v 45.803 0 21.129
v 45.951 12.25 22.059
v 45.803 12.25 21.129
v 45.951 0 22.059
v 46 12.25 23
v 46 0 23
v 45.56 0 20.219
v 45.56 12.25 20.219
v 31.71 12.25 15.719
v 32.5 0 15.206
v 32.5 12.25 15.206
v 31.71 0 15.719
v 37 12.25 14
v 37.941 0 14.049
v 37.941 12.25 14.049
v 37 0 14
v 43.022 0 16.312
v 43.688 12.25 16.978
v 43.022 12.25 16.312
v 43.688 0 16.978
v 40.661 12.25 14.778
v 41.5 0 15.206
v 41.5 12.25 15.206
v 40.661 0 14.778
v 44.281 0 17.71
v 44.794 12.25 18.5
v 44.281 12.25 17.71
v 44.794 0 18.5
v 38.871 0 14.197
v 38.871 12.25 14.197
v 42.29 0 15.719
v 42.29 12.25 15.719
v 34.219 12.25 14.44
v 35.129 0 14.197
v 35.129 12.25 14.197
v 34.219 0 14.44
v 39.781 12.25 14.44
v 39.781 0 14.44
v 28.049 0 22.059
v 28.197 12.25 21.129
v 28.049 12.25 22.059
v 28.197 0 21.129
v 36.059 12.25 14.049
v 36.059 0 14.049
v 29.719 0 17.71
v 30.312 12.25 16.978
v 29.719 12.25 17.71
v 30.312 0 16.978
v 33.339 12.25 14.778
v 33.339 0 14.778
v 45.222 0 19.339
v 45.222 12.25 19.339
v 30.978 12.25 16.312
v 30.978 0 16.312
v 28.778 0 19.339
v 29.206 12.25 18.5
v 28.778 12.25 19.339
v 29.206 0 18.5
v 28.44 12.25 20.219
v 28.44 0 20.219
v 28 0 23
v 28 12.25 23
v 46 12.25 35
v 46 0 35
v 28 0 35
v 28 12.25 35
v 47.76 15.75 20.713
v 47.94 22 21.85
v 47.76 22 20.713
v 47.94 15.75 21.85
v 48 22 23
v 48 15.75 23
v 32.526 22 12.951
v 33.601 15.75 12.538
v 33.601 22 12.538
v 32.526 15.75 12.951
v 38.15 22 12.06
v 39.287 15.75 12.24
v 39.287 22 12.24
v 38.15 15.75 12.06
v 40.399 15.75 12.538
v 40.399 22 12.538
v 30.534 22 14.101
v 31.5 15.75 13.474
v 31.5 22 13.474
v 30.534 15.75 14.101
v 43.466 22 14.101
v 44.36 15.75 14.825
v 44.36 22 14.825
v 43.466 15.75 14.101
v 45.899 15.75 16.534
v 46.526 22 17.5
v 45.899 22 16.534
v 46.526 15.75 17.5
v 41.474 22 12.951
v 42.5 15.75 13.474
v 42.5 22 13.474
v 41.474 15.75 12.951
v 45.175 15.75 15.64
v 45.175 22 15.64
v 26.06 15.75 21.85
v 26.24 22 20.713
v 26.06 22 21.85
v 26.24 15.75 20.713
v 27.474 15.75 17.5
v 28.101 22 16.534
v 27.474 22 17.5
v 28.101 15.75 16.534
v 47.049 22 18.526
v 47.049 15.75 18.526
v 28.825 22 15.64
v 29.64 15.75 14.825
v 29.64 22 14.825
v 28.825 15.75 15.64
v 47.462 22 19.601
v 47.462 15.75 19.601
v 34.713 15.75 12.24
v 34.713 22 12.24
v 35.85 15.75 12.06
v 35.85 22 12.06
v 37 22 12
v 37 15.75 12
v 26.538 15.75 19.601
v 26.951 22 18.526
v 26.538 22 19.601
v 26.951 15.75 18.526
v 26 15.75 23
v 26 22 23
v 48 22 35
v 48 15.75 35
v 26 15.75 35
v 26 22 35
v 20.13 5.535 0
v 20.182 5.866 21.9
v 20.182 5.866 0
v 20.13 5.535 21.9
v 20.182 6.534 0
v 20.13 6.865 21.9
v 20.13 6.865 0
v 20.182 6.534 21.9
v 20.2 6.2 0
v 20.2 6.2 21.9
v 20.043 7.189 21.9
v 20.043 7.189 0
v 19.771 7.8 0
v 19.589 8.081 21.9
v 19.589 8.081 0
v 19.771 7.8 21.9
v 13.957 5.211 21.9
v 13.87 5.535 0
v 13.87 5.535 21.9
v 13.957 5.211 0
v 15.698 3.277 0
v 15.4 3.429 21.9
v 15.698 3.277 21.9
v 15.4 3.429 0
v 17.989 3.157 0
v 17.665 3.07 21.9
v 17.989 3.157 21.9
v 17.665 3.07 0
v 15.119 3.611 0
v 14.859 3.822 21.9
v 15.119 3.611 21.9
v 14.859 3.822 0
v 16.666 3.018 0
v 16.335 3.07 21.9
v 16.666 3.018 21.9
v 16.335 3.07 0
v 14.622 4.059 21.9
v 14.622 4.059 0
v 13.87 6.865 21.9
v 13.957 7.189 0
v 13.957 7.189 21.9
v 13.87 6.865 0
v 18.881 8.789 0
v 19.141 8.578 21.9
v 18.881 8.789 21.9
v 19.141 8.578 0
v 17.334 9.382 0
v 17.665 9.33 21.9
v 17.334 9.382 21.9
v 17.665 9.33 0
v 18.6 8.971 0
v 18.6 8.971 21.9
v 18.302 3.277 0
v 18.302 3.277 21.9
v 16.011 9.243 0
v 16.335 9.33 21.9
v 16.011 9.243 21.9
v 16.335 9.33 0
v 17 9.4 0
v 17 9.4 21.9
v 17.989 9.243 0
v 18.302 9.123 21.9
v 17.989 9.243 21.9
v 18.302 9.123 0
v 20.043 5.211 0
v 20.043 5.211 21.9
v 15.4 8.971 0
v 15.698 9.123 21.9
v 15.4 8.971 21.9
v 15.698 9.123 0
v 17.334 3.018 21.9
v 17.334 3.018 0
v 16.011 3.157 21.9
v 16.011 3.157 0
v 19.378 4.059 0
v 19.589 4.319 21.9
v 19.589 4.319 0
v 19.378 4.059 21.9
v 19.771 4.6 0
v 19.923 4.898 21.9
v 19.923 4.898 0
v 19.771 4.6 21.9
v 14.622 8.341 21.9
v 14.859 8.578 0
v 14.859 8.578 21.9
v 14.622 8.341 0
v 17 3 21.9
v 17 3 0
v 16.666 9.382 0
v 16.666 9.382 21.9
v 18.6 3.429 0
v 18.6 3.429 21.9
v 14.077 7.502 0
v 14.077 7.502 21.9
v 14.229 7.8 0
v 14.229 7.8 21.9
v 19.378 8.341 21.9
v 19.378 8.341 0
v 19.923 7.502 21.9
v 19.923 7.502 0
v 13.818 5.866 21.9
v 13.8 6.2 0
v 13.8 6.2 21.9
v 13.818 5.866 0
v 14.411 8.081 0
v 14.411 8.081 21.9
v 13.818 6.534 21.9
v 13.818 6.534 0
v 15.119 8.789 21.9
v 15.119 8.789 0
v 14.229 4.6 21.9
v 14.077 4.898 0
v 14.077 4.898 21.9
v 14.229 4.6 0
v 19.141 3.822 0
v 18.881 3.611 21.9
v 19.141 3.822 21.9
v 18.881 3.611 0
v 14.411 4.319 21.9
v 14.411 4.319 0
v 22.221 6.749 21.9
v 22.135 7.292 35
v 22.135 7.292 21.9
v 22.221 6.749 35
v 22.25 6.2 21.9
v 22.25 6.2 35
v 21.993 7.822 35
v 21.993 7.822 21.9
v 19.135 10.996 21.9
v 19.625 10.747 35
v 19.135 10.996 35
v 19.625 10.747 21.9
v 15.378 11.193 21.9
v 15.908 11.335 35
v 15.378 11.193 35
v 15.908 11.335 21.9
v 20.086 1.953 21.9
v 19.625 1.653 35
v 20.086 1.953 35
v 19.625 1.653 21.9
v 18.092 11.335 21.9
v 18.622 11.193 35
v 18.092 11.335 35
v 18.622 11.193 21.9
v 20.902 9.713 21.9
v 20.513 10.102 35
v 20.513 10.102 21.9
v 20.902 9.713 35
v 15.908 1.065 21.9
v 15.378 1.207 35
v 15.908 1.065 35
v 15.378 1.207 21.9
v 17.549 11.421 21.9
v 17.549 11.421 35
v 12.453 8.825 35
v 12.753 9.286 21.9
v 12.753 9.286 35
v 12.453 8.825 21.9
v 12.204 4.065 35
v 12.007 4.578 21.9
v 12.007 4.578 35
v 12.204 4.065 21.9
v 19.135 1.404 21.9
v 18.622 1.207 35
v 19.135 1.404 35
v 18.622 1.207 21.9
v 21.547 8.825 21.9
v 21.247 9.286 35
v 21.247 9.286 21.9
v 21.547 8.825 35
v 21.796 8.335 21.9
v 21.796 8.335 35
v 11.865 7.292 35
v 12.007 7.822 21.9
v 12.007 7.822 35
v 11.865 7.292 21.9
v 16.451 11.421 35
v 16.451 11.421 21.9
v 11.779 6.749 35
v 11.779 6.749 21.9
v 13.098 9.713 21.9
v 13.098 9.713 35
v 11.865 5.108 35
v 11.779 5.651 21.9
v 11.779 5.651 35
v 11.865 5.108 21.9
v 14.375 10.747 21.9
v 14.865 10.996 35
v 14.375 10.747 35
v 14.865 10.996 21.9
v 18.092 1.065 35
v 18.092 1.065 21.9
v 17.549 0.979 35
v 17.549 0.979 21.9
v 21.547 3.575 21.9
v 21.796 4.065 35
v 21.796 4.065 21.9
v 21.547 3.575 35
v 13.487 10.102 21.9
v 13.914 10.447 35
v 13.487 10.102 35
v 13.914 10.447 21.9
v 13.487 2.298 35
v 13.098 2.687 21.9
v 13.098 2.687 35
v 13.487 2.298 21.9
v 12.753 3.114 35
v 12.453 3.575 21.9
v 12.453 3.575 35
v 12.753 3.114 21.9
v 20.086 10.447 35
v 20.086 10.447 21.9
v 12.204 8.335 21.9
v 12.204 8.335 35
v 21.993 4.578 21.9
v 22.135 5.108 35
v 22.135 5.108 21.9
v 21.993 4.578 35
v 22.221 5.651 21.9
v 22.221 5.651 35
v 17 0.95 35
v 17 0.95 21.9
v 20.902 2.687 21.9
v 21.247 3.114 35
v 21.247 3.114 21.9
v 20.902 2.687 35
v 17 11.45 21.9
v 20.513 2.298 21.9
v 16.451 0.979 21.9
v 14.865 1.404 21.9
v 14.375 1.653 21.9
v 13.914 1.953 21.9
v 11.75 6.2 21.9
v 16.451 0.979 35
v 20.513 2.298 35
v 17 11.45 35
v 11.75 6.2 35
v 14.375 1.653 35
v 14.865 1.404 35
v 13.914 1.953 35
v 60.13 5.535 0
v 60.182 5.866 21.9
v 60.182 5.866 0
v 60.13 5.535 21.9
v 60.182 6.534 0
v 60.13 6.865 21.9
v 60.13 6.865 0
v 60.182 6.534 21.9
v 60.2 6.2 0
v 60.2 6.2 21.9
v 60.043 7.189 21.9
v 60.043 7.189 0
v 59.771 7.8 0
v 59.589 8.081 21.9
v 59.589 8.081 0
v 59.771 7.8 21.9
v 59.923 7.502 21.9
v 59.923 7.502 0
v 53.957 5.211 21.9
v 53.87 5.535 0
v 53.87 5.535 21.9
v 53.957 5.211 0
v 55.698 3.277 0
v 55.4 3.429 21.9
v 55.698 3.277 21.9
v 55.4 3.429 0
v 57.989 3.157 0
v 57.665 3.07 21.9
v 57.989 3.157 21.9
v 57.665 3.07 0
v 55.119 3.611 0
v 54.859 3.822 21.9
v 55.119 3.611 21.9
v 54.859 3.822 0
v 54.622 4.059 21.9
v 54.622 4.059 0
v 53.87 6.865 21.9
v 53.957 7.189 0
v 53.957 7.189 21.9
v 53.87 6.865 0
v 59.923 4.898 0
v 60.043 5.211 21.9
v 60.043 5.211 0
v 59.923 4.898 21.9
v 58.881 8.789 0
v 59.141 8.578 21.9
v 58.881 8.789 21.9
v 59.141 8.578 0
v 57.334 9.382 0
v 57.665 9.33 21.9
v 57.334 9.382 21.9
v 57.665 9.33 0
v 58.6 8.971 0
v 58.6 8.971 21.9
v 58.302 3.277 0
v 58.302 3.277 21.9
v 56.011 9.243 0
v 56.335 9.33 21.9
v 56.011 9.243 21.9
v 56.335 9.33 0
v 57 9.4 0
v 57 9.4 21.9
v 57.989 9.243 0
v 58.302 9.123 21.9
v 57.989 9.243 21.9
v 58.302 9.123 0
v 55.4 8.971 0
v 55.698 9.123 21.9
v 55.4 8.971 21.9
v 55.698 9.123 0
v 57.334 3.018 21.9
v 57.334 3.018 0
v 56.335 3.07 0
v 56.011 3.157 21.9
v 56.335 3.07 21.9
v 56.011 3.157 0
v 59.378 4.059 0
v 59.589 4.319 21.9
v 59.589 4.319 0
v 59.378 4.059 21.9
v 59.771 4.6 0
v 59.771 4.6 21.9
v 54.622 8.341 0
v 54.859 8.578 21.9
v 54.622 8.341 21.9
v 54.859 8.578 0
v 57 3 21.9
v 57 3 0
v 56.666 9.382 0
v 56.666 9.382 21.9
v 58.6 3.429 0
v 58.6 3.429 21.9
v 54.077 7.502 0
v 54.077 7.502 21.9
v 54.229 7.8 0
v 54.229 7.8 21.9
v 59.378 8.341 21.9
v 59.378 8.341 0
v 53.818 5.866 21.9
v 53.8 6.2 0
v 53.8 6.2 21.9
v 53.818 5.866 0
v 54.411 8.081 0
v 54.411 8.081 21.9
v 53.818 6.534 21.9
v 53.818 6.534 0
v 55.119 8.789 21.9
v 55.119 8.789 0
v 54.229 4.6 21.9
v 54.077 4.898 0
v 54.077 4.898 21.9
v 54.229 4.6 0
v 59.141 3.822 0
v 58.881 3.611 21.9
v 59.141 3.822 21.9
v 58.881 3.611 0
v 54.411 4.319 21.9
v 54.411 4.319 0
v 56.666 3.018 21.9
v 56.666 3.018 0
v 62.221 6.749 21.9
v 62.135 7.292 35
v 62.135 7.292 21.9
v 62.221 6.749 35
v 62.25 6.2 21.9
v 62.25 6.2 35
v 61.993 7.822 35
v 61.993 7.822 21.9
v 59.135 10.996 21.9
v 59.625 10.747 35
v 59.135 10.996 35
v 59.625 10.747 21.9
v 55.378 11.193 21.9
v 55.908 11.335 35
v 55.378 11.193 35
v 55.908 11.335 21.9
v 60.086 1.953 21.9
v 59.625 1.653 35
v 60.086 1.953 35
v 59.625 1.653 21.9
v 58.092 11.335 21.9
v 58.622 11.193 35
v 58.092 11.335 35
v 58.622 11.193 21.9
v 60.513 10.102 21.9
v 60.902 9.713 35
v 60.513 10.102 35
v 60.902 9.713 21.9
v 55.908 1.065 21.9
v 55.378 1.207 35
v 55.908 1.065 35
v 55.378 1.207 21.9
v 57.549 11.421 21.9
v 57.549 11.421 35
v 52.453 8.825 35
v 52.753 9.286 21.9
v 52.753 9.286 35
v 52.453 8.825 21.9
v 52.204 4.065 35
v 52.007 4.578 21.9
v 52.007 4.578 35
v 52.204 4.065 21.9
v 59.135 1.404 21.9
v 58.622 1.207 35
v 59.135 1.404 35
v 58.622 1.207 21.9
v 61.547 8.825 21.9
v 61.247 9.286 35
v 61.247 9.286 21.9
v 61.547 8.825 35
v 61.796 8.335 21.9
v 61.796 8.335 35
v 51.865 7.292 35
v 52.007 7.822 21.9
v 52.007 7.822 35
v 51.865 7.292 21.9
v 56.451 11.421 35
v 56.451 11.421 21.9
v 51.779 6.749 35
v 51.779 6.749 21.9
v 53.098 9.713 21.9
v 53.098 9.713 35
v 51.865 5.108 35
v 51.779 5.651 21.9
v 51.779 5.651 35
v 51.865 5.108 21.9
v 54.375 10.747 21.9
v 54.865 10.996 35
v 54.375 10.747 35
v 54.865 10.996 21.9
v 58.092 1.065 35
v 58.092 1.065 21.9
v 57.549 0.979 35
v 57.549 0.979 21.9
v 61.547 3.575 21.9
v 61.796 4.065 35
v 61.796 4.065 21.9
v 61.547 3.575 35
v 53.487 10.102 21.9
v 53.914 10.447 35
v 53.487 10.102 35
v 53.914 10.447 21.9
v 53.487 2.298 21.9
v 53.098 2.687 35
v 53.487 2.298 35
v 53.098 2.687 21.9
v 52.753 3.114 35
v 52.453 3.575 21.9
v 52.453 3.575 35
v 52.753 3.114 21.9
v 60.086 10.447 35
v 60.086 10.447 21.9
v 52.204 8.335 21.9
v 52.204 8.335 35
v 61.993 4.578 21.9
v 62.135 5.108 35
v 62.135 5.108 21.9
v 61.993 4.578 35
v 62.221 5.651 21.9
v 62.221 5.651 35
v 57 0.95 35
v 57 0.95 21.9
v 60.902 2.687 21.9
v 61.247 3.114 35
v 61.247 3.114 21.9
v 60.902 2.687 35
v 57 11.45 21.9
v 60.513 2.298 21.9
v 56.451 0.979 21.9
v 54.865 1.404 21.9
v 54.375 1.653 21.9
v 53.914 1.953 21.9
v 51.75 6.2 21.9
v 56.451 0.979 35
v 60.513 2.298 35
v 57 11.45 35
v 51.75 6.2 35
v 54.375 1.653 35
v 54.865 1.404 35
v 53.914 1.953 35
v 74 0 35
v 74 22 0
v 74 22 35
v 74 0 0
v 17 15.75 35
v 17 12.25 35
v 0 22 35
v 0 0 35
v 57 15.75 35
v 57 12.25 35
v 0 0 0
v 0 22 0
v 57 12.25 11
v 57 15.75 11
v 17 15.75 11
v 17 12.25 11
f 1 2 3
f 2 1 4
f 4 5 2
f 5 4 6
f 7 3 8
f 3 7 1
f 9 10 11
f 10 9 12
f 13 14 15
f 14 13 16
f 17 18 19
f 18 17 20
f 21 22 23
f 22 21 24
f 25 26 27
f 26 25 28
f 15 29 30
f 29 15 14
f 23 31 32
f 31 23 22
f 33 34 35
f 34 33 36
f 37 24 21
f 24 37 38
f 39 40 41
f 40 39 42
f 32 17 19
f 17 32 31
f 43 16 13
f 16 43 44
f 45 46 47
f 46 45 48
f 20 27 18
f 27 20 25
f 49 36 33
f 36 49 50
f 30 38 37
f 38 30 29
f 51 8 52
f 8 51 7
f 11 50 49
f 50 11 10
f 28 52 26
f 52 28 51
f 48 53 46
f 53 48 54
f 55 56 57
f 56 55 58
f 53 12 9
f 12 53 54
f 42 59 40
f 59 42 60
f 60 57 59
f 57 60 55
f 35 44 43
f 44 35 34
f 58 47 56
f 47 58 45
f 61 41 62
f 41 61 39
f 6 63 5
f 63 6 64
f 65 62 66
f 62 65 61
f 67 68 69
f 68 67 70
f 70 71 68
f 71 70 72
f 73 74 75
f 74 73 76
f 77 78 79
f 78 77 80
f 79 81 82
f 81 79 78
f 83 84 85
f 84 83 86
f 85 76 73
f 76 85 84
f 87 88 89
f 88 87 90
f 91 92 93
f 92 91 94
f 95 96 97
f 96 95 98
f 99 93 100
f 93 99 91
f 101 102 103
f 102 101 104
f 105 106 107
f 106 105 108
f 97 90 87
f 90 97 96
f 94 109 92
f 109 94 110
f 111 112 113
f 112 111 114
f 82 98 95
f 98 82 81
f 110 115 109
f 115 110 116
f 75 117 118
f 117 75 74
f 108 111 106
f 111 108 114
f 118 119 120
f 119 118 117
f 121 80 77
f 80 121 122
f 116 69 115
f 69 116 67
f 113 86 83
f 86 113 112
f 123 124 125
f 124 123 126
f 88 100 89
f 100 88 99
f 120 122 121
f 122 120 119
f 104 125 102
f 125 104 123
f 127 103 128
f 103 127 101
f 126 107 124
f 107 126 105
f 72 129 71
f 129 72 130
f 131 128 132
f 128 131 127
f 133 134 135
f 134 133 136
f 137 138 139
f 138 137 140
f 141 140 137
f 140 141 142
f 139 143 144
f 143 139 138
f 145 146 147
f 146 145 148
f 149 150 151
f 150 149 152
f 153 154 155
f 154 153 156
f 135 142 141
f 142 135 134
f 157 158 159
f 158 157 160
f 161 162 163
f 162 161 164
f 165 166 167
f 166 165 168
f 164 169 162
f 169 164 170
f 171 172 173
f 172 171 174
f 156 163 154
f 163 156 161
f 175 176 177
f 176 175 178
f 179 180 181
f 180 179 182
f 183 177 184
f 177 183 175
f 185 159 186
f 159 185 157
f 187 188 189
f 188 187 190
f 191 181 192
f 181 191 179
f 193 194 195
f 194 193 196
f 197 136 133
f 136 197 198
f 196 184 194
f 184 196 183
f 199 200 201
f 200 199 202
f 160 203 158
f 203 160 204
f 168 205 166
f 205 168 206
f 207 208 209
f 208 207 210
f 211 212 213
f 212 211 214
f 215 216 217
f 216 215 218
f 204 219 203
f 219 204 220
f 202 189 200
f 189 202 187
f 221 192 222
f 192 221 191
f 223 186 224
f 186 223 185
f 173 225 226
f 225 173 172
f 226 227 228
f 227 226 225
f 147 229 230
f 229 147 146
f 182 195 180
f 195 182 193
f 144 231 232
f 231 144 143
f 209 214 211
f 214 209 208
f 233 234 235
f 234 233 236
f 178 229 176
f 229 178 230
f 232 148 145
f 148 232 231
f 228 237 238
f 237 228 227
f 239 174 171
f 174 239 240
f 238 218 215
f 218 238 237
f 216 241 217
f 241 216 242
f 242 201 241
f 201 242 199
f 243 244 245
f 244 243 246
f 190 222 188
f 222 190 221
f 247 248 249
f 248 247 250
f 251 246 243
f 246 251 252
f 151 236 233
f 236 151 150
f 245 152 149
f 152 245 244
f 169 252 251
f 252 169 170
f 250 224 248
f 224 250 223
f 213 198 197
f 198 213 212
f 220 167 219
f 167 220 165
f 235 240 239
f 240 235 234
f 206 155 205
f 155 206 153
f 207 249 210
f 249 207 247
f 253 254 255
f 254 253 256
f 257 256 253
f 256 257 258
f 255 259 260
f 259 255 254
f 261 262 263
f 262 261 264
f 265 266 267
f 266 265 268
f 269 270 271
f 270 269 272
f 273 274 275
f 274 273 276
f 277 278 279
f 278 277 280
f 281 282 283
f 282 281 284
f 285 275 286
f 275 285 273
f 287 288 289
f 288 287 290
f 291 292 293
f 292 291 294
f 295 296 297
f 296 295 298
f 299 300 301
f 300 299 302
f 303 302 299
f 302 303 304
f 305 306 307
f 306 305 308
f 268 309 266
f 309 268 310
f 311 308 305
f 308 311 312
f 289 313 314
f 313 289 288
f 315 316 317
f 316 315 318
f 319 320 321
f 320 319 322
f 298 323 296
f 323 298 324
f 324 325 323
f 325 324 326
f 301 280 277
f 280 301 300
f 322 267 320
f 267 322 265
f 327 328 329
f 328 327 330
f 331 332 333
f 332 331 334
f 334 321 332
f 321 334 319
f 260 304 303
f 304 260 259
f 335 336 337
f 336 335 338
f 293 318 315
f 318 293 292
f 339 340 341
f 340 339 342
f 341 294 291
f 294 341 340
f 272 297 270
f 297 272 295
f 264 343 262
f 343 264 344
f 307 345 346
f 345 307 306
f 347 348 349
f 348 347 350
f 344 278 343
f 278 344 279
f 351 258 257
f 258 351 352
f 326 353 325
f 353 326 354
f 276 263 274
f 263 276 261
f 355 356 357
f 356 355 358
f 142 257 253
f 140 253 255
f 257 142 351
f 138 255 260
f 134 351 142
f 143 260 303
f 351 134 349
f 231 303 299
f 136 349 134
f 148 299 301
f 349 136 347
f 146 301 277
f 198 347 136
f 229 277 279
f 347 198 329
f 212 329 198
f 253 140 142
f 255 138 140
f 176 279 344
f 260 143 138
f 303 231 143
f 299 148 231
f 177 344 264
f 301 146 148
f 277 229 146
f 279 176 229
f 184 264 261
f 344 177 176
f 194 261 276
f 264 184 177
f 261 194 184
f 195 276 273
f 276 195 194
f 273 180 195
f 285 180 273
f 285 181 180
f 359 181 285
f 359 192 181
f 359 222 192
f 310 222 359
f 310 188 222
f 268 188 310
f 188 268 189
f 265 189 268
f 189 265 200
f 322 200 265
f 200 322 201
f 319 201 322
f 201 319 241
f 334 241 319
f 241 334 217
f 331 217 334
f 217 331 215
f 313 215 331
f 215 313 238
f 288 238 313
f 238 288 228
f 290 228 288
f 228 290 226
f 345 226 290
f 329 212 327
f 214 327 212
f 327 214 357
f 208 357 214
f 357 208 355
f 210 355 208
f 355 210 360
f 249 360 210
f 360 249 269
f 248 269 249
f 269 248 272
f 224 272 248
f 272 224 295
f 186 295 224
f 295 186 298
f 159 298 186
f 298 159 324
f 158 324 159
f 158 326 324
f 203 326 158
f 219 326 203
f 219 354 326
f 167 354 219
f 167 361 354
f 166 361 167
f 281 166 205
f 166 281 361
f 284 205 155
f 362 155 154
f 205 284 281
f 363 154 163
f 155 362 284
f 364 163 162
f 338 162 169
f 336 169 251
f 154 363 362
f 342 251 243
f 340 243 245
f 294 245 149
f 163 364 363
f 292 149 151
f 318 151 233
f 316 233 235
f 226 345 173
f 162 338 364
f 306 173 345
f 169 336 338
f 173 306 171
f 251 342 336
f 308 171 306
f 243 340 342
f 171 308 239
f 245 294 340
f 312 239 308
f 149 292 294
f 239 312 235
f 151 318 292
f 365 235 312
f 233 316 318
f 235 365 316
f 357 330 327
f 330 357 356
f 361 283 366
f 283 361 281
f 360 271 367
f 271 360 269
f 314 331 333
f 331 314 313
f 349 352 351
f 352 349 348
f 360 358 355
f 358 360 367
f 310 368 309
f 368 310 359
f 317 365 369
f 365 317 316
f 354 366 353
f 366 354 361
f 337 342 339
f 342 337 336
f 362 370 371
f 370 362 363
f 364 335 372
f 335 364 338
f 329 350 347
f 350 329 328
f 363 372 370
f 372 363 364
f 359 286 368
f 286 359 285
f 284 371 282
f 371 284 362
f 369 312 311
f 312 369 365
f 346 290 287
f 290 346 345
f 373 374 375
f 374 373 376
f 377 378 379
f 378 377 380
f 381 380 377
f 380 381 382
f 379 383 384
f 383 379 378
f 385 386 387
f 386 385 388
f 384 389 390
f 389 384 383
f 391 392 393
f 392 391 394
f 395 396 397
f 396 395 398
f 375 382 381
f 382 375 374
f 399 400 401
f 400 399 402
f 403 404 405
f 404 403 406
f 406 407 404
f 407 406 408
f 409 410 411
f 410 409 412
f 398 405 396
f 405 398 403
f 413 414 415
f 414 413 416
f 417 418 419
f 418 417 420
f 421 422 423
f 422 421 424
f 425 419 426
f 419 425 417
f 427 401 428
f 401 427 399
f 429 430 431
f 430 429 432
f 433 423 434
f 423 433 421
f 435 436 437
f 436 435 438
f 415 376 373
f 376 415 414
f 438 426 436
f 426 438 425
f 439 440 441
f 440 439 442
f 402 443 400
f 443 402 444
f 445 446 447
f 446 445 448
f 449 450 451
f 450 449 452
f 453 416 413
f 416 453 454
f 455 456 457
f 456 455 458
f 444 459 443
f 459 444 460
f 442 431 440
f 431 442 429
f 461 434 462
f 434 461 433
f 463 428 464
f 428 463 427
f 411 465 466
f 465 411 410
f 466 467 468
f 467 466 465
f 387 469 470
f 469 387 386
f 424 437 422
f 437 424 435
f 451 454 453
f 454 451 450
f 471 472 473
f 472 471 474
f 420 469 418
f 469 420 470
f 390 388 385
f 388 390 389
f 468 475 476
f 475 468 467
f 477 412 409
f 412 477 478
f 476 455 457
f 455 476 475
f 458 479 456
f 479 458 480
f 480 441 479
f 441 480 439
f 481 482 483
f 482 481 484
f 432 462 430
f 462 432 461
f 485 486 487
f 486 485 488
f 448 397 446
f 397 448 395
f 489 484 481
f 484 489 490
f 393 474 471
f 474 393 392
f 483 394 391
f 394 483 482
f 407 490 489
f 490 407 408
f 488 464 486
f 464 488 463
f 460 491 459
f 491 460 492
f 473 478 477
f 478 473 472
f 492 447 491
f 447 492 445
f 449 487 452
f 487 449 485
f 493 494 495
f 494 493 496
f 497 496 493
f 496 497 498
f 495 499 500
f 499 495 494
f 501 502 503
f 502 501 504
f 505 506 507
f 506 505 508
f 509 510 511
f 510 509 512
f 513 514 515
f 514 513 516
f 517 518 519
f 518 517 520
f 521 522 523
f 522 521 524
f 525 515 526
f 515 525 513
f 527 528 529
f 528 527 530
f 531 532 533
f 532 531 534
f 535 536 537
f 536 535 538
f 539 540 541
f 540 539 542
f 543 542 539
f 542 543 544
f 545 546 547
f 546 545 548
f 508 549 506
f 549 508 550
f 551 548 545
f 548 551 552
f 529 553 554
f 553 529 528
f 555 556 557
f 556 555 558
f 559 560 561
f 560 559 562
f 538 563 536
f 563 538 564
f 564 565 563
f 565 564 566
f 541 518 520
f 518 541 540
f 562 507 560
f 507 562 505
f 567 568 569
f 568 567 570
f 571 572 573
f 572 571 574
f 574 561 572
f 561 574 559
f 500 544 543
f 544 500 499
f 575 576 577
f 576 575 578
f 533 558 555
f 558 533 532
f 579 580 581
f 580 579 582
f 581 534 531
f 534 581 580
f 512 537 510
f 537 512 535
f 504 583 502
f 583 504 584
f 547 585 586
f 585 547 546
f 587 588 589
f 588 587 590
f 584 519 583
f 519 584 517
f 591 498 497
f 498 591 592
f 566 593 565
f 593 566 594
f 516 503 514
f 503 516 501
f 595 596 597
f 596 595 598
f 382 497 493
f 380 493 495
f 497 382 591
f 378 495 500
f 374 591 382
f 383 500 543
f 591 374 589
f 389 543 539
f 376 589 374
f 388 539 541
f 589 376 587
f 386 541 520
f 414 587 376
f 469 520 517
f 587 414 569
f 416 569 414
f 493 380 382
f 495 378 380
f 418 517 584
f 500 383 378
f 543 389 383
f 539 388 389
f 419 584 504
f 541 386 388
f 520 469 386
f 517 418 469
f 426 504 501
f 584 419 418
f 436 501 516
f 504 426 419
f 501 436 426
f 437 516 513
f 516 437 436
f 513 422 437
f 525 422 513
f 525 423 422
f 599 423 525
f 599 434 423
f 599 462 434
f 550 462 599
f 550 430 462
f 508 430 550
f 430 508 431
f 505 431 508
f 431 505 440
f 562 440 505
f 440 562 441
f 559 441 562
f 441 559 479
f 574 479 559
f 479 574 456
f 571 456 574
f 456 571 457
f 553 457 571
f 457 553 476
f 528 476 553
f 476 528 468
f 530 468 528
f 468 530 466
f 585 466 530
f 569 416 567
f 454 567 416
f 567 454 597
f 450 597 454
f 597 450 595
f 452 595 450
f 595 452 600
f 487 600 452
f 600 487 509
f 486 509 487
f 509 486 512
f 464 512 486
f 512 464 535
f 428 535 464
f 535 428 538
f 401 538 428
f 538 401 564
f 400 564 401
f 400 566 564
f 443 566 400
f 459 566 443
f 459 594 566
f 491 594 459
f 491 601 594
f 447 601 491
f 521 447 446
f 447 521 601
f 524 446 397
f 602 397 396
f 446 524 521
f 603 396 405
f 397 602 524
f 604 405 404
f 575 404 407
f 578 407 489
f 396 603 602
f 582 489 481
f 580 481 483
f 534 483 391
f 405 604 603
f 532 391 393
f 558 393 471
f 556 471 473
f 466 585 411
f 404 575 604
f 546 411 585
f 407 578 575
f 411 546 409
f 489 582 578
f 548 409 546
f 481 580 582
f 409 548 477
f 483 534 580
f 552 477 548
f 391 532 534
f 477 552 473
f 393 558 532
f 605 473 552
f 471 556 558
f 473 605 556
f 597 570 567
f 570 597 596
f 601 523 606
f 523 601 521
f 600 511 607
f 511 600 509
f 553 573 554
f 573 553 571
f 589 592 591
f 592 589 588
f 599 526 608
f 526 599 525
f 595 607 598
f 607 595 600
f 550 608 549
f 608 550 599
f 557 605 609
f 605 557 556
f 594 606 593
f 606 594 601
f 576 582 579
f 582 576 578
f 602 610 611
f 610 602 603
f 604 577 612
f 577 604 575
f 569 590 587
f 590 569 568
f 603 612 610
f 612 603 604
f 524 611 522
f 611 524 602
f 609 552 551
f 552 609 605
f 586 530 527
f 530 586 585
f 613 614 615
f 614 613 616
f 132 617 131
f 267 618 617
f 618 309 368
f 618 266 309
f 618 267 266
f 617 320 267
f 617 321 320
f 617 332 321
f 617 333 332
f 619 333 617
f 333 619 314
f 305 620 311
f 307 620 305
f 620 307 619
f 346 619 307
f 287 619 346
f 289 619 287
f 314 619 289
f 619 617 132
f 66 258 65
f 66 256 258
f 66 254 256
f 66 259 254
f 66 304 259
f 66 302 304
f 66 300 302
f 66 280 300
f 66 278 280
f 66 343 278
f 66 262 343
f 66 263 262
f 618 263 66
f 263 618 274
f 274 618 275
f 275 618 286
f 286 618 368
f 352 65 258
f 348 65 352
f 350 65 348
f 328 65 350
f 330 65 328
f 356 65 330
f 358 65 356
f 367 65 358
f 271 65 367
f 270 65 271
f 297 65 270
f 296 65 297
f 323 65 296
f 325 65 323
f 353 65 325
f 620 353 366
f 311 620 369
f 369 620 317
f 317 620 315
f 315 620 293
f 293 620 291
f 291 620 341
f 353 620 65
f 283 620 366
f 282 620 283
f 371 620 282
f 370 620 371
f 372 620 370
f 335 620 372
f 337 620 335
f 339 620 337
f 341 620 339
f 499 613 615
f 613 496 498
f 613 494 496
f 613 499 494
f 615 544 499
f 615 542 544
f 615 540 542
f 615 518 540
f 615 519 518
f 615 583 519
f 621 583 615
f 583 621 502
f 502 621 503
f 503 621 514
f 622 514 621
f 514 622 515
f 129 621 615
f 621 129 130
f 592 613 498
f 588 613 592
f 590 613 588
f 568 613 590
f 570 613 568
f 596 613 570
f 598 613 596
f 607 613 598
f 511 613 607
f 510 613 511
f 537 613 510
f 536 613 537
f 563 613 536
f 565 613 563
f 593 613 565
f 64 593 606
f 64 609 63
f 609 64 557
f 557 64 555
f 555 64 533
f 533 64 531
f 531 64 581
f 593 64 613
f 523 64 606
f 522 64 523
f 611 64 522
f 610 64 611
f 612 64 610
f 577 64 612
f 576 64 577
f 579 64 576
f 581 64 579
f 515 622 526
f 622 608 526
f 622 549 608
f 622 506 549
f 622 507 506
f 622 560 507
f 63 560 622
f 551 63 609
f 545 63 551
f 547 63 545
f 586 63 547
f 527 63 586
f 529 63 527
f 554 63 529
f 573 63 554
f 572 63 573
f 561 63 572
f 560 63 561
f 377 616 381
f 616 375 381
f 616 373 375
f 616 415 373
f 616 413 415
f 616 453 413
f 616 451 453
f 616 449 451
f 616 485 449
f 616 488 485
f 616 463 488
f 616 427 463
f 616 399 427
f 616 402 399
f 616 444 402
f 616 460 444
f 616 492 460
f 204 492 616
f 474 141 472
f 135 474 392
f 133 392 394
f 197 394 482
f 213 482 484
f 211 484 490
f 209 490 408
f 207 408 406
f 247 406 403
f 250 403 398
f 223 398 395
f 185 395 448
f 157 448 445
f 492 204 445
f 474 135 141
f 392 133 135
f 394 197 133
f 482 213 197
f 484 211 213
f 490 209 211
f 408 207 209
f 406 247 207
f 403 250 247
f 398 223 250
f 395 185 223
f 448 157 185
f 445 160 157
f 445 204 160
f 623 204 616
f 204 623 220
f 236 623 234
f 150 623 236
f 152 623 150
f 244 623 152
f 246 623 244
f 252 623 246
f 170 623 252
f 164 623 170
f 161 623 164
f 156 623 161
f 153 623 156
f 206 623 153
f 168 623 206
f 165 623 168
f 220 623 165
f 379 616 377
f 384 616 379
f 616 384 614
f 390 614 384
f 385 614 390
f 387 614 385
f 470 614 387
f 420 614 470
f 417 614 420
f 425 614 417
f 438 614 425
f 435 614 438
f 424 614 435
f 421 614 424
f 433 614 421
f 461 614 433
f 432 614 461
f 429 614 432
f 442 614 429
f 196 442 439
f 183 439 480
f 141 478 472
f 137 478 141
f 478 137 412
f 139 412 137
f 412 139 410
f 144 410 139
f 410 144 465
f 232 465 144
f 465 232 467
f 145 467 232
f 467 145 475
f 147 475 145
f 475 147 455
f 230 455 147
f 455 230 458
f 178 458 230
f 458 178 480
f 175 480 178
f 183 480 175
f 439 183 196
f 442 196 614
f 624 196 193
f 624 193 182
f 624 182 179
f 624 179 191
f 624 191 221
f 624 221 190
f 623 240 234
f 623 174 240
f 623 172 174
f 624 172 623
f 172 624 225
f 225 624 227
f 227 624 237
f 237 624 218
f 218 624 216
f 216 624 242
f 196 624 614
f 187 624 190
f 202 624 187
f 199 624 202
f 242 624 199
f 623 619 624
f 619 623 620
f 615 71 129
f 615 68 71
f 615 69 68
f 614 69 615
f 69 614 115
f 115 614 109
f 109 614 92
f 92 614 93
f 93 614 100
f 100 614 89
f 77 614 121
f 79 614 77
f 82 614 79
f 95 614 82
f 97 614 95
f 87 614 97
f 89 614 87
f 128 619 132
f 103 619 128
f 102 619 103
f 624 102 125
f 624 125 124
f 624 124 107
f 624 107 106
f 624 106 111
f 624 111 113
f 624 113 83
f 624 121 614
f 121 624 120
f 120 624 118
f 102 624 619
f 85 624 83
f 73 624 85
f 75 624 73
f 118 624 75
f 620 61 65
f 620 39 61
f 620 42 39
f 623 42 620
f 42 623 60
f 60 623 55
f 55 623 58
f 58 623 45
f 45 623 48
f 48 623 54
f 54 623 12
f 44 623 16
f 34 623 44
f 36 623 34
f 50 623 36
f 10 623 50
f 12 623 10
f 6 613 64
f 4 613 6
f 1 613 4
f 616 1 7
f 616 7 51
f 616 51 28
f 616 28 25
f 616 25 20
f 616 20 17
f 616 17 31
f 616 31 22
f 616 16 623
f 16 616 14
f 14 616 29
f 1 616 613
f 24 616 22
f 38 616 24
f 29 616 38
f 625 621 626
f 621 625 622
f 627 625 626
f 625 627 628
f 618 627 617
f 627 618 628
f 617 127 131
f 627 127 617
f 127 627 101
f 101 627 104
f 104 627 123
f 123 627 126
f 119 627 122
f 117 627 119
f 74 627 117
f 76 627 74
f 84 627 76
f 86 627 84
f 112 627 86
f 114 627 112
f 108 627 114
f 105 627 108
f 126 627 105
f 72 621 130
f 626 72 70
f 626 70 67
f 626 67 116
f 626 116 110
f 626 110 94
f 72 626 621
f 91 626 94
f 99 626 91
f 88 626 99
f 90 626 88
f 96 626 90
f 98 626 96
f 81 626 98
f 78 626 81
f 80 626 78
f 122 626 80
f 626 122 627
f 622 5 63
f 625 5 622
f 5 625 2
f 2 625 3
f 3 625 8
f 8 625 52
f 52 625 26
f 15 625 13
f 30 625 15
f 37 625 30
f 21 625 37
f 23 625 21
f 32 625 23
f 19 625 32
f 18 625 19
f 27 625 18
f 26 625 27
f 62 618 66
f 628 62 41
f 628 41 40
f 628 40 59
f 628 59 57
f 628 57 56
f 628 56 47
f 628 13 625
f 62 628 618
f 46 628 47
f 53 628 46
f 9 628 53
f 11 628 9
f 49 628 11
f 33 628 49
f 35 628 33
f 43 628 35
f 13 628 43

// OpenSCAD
// file: mount.scad
//nema_17_mount();

module nema_17_mount()
{
	$fs = 0.1;

	wall_thickness = 5;
	motor_width = 42;
	frame_width = motor_width + (wall_thickness + 1)*2;
	bolt = 4;
	height = 25;
	

	
	//center the whole thing in X
	translate([-frame_width/2, 0, 0])
	{
		difference()
		{
			//build the main unit.
			union()
			{
				//structure
				cube([wall_thickness, frame_width, frame_width]); //front face
				cube([frame_width, wall_thickness, frame_width]); //left face
				translate([frame_width-wall_thickness, 0, 0])     //right face
					cube([wall_thickness, frame_width, frame_width]);
            }

			//nema 17 mount
			rotate([90, 0, 0])
			{
				translate([frame_width/2, height, -wall_thickness])
				{
					translate([15.5, 15.5, 0])
						cylinder(r=bolt/2, h=wall_thickness+1);
					translate([-15.5, 15.5, 0])
						cylinder(r=bolt/2, h=wall_thickness+1);
					translate([15.5, -15.5, 0])
						cylinder(r=bolt/2, h=wall_thickness+1);
					translate([-15.5, -15.5, 0])
						cylinder(r=bolt/2, h=wall_thickness+1);

					cylinder(r=11.5, h=wall_thickness+1);

					translate([-11.5, 0, 0])
						cube([23, frame_width, wall_thickness+1]);
				}
			}

			//back slant cutaway
			translate([0, 0, frame_width+wall_thickness])
				rotate([45, 0, 0])
					translate([-frame_width, 0, -frame_width*2])
						cube(size=[frame_width*4, frame_width*2, frame_width*4]);


			//cutout / tidy up cubes.
			translate([wall_thickness, wall_thickness-0.1, -1])
				cube([frame_width-wall_thickness*2, frame_width-wall_thickness, motor_width*2]);
			translate([-frame_width/2,-frame_width/2, wall_thickness+motor_width])
				cube([frame_width*2, frame_width*2, frame_width]);
			translate([-frame_width/2, -frame_width/2,-frame_width])
				cube([frame_width*2, frame_width*2, frame_width]);
		}
	}
}
// main file
include<./mount.scad>

$fn=60;

lenght_fix_support=74;
depth_fix_support=22;
height_fix_support=35;

height_feet=52;

lenght_carriage=73;
depth_carriage=69;
height_carriage=height_fix_support+5;

//syringe
diameter_body=22;
diameter_end_body=40;
depth_end_body=3.5;
diameter_plunger_end=24;
depth_plunger_end=2.2;
diameter_plunger=18;


screw_radius=6.4/2;
screw_radius_top=10.5/2;
screw_head_height=6;

m3_radius=3.6/2;

module fix_support() {
    center_pad=3;
   difference(){
       cube([ lenght_fix_support,depth_fix_support,height_fix_support]);
    
       //syringe plunger
       translate ([lenght_fix_support/2,-.1,height_fix_support-diameter_plunger_end/2]) {
            rotate ([-90,0,0])
                cylinder(r=diameter_plunger/2,h=(depth_fix_support-depth_end_body)/2+center_pad+.2);
            translate ([-diameter_plunger/2,0,0])
                cube([diameter_plunger,(depth_fix_support-depth_end_body)/2+center_pad+.2,diameter_plunger_end]);}
   
    //syringe end
        translate ([(lenght_fix_support-diameter_end_body)/2,(depth_fix_support-depth_end_body)/2+center_pad,height_fix_support-diameter_plunger_end])
            cube([diameter_end_body,depth_end_body,diameter_plunger_end+.1]);
            
            
      //syringe body
            translate ([lenght_fix_support/2,(depth_fix_support+depth_end_body)/2+center_pad-.1,height_fix_support-diameter_plunger_end/2]) {
            rotate ([-90,0,0])
                cylinder(r=diameter_body/2,h=(depth_fix_support-depth_end_body)/2+.2);
            translate ([-diameter_body/2,0,0])
                cube([diameter_body,(depth_fix_support-depth_end_body)/2+.2,diameter_plunger_end]);}
                
        // screw
         screw_spacing=40;
         screw_lenght=28;
          
         hole_pad=3;
                
         for (i =[-1,1]) {
             translate([lenght_fix_support/2+i*screw_spacing/2,hole_pad+screw_radius,-0.1]){
             
                     cylinder(r=screw_radius,h=height_fix_support+.2);
                     translate([0,0,screw_lenght-screw_head_height]) cylinder(r=screw_radius_top,h=height_fix_support+.2);
                 
             }}
                
            }
};

module carriage () {
    screw_x_space=60;
    screw_y_space=56;
    screw_lenght=23;
    depth_retainer=depth_carriage-screw_y_space;
    difference () {
        union(){
            cube([lenght_carriage,depth_carriage,screw_lenght]);
            translate([0,screw_y_space,0]) cube([lenght_carriage,depth_retainer, height_carriage]);
        }
        
        //syringe plunger
       translate ([lenght_carriage/2,depth_carriage-depth_retainer/2-.1,height_carriage-diameter_plunger_end/2]) {
            rotate ([-90,0,0])
                cylinder(r=diameter_plunger/2,h=depth_retainer/2+.2);
            translate ([-diameter_plunger/2,0,0])
                cube([diameter_plunger,depth_retainer+.2,diameter_plunger_end]);}
                
        //syringe end
        translate ([(lenght_carriage-diameter_plunger_end)/2,depth_carriage-(depth_retainer+depth_plunger_end)/2,height_carriage-diameter_plunger_end])
            cube([diameter_plunger_end,depth_plunger_end,diameter_plunger_end+.1]);
     
          //hole 
          for (y =[-1,1]) {
              for (x = [-1,1]) {
                    translate([lenght_carriage/2+x*screw_x_space/2,depth_carriage/2+y*screw_y_space/2,-0.1]){
             
                     cylinder(r=screw_radius,h=height_carriage+.2);
                     translate([0,0,screw_lenght-screw_head_height]) cylinder(r=screw_radius_top,h=height_carriage+.2);

    }
}}


}
}

//carriage();

module foot (){
    difference(){
       cube([ lenght_fix_support,depth_fix_support,height_feet]);

// screw
         screw_spacing=60;
         screw_lenght=28;
         M8_radius=8.4/2;
         M8_top_height=8;
         M8_radius_top=13.5/2;
         hole_pad=3;
                
         for (i =[-1,1]) {
             translate([lenght_fix_support/2+i*screw_spacing/2,depth_fix_support/2,-0.1]){
             
                     cylinder(r=M8_radius,h=height_fix_support+.2);
                     translate([0,0,screw_lenght-M8_top_height]) cylinder(r=M8_radius_top,h=height_fix_support+.2);
                 
             }}
  
             
            }
    
};

module front_foot() {
    difference () {
        foot ();
// slant cut
        # translate([-0.1,0,29])    
        rotate ([5,0,0]) cube([ lenght_fix_support+.2,depth_fix_support+2,height_fix_support]);
        
    
}
}


motor_gap=10.5;
length_motor_support=126;

module rear_foot() {
    height=21; //add from front for 5deg angle
    support_thickness=5;
    
    difference () {
        union() {
            foot ();
            translate([0,depth_fix_support-.1,motor_gap])
            cube ([lenght_fix_support,length_motor_support-depth_fix_support,support_thickness]);
        }
// slant cut
         translate([-0.1,0,29+height])    
        rotate ([5,0,0]) cube([ lenght_fix_support+.2,depth_fix_support+2,height_fix_support]);
        
 // motor fixation
        
        for (x =[5,lenght_fix_support-5]) {
            hull (){
                translate([x,length_motor_support-10-50,motor_gap-.1])
                cylinder(r=m3_radius, h=support_thickness+.2);
                translate([x,length_motor_support-10,motor_gap-.1])
                cylinder(r=m3_radius, h=support_thickness+.2);
            }
        }
        
    
}
}

module rear_foot_print1 () {
    difference () {
        rear_foot();
        translate([-0.1,-0.1,motor_gap-.1])
            cube ([lenght_fix_support+.2,length_motor_support+.2,height_fix_support+motor_gap]);
    }
}
module rear_foot_print2 () {
    difference () {
        rear_foot();
        translate([-0.1,-0.1,-.1])
            cube ([lenght_fix_support+.2,length_motor_support+.2,motor_gap+.1]);
    }
}


module motor () {
    motor_width = 42;
    wall_thickness = 5;
    
    difference () {
    union () {
        nema_17_mount();
        
        //side support
        for (i =[-1,1]){ 
        translate([i*(motor_width/2+1+((lenght_fix_support-motor_width)/2-1)/2),(motor_width+12)/2,wall_thickness/2])
        cube ([(lenght_fix_support-motor_width)/2-1,motor_width+12,wall_thickness],center=true);
        }
    }
        //fixation hole
        
        for (x=[-1,1]){ 
            for (y =[10,motor_width+2]){ 
                translate([x*(lenght_fix_support/2-5),y,-.1])
                    cylinder(r=m3_radius,h=wall_thickness+.2);
            }
        }
    }
}


fix_support() ;
//motor ();
//front_foot();
//rear_foot_print1();
//rear_foot_print2();
